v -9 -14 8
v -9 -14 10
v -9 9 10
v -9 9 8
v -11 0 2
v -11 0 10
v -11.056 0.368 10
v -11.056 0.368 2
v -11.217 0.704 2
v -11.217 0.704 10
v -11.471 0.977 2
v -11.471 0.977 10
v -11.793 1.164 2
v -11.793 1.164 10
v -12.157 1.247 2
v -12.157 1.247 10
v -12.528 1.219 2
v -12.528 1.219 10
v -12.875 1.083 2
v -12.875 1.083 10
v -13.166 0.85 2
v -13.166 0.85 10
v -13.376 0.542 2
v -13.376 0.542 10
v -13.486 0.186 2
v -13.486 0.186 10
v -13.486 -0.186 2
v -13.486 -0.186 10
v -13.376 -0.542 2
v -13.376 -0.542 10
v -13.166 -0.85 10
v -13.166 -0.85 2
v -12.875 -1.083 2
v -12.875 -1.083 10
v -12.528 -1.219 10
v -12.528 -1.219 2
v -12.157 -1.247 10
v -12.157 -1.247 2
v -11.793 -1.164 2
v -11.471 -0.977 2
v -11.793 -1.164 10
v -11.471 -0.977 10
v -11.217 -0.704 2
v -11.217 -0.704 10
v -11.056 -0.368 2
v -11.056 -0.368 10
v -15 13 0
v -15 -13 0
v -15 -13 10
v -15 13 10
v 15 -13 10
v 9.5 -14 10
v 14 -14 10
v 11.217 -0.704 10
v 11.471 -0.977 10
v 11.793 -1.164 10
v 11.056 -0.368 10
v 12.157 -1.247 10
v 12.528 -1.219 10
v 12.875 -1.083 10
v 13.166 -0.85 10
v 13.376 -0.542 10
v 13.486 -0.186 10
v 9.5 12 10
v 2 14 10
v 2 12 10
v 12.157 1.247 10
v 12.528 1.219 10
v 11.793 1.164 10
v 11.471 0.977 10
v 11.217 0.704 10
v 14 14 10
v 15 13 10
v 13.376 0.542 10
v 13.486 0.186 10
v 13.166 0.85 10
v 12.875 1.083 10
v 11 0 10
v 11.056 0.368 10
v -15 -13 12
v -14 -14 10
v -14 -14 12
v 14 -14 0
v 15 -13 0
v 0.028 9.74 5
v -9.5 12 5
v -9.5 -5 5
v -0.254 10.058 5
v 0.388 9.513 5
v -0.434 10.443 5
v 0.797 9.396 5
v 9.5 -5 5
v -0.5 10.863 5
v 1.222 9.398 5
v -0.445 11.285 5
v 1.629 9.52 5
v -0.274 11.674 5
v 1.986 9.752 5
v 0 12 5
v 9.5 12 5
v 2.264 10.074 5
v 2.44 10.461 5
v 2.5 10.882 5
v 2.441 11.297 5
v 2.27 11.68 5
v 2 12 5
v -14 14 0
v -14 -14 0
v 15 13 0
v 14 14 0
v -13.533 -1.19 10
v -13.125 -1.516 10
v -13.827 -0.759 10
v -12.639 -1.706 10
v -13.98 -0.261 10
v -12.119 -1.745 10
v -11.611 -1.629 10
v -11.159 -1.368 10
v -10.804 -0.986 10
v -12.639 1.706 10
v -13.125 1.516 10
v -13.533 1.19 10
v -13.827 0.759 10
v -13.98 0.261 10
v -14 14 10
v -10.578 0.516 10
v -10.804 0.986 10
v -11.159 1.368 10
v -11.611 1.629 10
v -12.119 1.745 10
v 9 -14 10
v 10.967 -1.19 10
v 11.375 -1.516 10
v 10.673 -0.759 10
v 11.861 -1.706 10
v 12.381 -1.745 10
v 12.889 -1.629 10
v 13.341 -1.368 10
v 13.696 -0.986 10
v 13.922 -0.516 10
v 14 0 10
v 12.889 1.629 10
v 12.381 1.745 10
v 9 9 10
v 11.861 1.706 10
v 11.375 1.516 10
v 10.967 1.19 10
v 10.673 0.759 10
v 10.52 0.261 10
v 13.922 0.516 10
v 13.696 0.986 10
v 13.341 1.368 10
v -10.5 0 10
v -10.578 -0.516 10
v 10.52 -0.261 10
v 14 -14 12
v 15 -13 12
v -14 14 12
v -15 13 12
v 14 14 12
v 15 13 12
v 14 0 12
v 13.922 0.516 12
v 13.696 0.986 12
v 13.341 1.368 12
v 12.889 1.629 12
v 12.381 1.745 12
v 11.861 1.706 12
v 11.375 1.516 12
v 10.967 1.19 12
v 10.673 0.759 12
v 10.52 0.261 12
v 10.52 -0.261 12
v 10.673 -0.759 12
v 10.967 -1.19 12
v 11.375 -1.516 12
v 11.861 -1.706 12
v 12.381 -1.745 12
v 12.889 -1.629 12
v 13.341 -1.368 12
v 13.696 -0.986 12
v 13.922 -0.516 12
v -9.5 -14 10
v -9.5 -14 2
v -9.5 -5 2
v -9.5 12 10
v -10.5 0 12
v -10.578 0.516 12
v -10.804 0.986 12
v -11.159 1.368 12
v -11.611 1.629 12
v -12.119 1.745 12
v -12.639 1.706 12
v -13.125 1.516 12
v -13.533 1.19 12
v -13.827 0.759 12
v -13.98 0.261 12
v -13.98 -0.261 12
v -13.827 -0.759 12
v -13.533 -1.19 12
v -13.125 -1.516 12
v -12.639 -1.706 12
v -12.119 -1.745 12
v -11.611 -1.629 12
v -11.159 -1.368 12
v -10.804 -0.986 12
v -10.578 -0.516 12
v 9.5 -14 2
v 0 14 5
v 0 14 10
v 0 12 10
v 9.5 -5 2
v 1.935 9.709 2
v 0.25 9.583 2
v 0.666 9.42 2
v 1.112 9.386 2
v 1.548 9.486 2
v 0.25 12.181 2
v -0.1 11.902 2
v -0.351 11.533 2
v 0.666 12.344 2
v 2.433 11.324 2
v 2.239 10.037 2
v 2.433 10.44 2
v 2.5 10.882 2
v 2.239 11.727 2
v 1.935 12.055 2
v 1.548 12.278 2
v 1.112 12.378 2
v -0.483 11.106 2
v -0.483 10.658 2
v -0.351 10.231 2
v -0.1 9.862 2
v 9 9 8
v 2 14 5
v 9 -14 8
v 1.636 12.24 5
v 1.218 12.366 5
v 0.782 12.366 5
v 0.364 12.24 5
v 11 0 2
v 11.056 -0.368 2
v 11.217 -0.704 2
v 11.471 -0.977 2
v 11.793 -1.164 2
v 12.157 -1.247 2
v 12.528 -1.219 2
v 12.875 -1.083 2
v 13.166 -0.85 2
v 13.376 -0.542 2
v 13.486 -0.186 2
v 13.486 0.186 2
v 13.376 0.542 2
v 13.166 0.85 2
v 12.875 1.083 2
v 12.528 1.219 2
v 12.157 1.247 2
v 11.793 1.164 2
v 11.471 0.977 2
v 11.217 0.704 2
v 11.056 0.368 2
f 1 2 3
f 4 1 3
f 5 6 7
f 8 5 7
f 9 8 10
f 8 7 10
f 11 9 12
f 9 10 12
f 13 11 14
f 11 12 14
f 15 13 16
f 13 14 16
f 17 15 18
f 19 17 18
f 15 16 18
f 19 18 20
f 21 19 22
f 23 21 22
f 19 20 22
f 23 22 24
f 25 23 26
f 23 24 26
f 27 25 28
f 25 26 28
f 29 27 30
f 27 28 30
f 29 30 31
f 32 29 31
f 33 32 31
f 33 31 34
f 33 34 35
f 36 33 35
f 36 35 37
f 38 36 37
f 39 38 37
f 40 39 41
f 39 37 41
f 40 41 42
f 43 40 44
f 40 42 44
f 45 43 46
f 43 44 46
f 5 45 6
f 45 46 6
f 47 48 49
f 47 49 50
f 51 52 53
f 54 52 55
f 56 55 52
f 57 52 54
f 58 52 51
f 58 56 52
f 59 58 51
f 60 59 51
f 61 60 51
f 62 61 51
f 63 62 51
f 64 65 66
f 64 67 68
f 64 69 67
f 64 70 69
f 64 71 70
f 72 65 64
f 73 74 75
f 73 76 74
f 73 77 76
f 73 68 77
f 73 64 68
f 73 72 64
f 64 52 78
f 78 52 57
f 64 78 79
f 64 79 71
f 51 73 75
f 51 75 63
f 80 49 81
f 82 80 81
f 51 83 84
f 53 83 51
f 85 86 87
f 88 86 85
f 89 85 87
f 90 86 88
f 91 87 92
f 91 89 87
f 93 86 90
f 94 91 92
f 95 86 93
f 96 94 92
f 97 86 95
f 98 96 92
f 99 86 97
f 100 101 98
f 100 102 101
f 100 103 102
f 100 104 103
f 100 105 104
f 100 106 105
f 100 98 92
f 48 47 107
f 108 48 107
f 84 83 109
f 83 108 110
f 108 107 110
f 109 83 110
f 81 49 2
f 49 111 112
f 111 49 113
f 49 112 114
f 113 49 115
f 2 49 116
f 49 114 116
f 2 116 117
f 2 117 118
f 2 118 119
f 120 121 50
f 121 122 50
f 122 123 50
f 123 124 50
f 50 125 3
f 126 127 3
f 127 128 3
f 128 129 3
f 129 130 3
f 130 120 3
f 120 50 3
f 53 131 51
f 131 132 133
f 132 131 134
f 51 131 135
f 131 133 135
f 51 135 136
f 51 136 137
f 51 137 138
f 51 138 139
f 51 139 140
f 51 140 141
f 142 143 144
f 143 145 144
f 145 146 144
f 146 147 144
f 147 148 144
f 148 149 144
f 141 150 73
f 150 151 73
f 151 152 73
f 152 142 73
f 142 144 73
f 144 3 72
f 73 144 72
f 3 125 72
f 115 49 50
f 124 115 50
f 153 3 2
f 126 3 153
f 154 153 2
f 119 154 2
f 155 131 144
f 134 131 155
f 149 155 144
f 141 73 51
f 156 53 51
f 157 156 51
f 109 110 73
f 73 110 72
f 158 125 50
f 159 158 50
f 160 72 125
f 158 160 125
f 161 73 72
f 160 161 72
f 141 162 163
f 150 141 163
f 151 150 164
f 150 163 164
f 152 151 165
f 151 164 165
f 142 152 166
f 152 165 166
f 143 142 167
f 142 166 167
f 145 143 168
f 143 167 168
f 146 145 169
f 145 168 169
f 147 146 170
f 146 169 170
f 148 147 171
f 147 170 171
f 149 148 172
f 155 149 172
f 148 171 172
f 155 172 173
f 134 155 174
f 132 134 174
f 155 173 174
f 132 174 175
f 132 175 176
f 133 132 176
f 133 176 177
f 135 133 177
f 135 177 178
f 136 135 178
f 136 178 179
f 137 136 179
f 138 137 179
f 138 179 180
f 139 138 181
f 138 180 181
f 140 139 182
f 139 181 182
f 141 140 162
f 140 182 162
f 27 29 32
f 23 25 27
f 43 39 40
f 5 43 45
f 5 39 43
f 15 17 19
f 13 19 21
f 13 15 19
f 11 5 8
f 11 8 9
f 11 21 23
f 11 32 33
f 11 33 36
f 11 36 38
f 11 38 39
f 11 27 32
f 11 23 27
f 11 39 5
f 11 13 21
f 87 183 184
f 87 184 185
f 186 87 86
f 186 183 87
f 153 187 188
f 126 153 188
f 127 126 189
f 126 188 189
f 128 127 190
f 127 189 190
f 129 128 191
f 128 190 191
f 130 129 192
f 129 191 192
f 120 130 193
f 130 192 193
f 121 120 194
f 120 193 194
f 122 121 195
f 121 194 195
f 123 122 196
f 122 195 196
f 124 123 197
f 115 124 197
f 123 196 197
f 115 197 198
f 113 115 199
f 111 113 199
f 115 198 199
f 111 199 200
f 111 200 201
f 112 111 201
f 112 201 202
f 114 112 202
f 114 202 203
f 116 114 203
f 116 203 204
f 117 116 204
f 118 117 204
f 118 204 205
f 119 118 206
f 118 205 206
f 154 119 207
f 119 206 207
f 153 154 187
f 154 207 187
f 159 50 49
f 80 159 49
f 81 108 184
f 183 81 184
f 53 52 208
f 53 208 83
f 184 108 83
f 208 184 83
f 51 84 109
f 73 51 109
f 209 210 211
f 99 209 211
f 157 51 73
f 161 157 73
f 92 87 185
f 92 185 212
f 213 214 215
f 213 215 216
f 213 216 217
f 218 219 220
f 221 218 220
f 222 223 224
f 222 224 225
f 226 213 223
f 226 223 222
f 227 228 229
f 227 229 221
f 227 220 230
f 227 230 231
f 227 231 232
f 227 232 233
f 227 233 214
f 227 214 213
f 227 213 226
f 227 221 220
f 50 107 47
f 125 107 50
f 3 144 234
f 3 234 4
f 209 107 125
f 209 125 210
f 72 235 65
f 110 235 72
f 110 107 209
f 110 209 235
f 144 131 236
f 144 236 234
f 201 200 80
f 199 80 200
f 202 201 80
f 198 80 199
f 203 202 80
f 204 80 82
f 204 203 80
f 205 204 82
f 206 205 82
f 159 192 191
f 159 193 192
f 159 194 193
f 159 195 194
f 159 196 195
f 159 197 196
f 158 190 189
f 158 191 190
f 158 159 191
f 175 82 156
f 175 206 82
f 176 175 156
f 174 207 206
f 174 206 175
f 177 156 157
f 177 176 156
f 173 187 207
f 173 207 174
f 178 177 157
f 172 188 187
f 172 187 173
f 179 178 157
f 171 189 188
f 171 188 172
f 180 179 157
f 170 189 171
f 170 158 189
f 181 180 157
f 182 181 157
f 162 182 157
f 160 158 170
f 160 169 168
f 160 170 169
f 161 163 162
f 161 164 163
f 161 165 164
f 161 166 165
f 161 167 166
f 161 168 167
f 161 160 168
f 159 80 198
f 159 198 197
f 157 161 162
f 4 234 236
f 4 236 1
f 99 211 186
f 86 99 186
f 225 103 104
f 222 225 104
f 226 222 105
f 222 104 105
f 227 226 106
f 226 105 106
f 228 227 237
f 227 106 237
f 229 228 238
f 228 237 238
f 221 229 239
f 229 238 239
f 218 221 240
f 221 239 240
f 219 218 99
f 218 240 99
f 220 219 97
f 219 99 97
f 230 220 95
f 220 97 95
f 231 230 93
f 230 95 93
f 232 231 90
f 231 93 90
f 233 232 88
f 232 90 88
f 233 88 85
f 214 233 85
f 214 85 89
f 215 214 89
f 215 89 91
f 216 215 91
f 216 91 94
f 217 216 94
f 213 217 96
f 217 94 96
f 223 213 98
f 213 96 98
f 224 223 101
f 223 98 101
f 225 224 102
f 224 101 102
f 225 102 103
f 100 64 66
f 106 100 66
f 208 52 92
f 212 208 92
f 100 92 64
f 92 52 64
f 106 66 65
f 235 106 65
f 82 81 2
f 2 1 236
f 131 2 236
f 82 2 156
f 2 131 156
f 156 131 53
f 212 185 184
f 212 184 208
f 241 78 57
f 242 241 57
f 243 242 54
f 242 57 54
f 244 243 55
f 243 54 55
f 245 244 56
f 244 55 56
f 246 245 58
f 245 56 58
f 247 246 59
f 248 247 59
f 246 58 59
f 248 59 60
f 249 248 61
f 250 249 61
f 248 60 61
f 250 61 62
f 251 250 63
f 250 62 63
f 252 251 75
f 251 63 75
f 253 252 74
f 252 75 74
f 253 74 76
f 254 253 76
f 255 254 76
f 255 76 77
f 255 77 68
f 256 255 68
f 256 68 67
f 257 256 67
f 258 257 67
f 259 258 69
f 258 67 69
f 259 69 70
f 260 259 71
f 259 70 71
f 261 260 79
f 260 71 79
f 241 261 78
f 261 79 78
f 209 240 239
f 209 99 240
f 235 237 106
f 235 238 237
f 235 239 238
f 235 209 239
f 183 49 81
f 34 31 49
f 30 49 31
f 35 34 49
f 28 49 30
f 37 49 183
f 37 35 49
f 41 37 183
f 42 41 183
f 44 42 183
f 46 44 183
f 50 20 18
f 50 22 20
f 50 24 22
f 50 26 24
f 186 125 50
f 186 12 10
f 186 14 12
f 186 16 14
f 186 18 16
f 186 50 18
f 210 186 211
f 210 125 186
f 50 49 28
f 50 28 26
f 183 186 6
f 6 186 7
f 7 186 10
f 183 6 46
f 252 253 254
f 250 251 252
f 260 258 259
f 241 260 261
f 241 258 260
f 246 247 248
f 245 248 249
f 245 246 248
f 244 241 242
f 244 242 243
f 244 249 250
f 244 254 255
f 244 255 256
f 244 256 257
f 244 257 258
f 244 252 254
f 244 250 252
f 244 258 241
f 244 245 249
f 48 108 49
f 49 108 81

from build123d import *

# Parameters (mm, degrees)
SKETCH1_W           = 30
SKETCH1_H           = 28
BOSS_EXTRUDE1_DEPTH = 10
CUT_EXTRUDE1_DEPTH  = 5
SKETCH3_R           = 1.5
SKETCH3_W           = 19
SKETCH3_H           = 9
CUT_EXTRUDE2_DEPTH  = 3
CHAMFER1_SIZE       = 1
SKETCH4_R           = 1.25
CUT_EXTRUDE3_DEPTH  = 8
BOSS_EXTRUDE2_DEPTH = 2
SKETCH6_R           = 1.75
CUT_EXTRUDE4_DEPTH  = 2
SKETCH7_W           = 18
SKETCH7_H           = 23
BOSS_EXTRUDE3_DEPTH = 2


with BuildPart() as part:
    # Sketch1 → Boss-Extrude1 (new body)
    with BuildSketch(Plane.XY):
        Rectangle(SKETCH1_W, SKETCH1_H)
    extrude(amount=BOSS_EXTRUDE1_DEPTH)

    # Sketch2 → Cut-Extrude1 (cut)
    with BuildSketch(Plane.XY.offset(10)):
        Polygon((0, 14), (0, 12), (-9.5, 12), (-9.5, -14), (9.5, -14), (9.5, 12), (2, 12), (2, 14), align=None)
    extrude(amount=-CUT_EXTRUDE1_DEPTH, mode=Mode.SUBTRACT)

    # Sketch3 → Cut-Extrude2 (cut)
    with BuildSketch(Plane.XY.offset(5)):
        with Locations((1, 10.881966011)):
            Circle(SKETCH3_R)
        with Locations((0, -9.5)):
            Rectangle(SKETCH3_W, SKETCH3_H)
    extrude(amount=-CUT_EXTRUDE2_DEPTH, mode=Mode.SUBTRACT)

    # Chamfer1
    chamfer1_edges = [part.edges().sort_by_distance(p)[0] for p in [
        (15, -14, 5),
        (-15, -14, 5),
        (-15, 14, 5),
        (15, 14, 5),
    ]]
    chamfer(chamfer1_edges, length=CHAMFER1_SIZE)

    # Sketch4 → Cut-Extrude3 (cut)
    with BuildSketch(Plane.XY.offset(10)):
        with Locations((-12.25, 0)):
            Circle(SKETCH4_R)
        with Locations(Location((12.25, 0, 0), (0, 0, 180))):
            Circle(SKETCH4_R)
    extrude(amount=-CUT_EXTRUDE3_DEPTH, mode=Mode.SUBTRACT)


with BuildPart() as body_2:
    # Sketch5 → Boss-Extrude2 (new body)
    with BuildSketch(Plane.XY.offset(10)):
        Polygon((-14, 14), (-15, 13), (-15, -13), (-14, -14), (14, -14), (15, -13), (15, 13), (14, 14), align=None)
    extrude(amount=BOSS_EXTRUDE2_DEPTH)

    # Sketch6 → Cut-Extrude4 (cut)
    with BuildSketch(Plane.XY.offset(12)):
        with Locations((-12.25, 0)):
            Circle(SKETCH6_R)
        with Locations((12.25, 0)):
            Circle(SKETCH6_R)
    extrude(amount=-CUT_EXTRUDE4_DEPTH, mode=Mode.SUBTRACT)

    # Sketch7 → Boss-Extrude3 (add)
    with BuildSketch(Plane(origin=(0, 0, 10), x_dir=(-1, 0, 0), z_dir=(0, 0, -1))):
        with Locations((0, -2.5)):
            Rectangle(SKETCH7_W, SKETCH7_H)
    extrude(amount=BOSS_EXTRUDE3_DEPTH)


solid = Compound([part.part, body_2.part])
